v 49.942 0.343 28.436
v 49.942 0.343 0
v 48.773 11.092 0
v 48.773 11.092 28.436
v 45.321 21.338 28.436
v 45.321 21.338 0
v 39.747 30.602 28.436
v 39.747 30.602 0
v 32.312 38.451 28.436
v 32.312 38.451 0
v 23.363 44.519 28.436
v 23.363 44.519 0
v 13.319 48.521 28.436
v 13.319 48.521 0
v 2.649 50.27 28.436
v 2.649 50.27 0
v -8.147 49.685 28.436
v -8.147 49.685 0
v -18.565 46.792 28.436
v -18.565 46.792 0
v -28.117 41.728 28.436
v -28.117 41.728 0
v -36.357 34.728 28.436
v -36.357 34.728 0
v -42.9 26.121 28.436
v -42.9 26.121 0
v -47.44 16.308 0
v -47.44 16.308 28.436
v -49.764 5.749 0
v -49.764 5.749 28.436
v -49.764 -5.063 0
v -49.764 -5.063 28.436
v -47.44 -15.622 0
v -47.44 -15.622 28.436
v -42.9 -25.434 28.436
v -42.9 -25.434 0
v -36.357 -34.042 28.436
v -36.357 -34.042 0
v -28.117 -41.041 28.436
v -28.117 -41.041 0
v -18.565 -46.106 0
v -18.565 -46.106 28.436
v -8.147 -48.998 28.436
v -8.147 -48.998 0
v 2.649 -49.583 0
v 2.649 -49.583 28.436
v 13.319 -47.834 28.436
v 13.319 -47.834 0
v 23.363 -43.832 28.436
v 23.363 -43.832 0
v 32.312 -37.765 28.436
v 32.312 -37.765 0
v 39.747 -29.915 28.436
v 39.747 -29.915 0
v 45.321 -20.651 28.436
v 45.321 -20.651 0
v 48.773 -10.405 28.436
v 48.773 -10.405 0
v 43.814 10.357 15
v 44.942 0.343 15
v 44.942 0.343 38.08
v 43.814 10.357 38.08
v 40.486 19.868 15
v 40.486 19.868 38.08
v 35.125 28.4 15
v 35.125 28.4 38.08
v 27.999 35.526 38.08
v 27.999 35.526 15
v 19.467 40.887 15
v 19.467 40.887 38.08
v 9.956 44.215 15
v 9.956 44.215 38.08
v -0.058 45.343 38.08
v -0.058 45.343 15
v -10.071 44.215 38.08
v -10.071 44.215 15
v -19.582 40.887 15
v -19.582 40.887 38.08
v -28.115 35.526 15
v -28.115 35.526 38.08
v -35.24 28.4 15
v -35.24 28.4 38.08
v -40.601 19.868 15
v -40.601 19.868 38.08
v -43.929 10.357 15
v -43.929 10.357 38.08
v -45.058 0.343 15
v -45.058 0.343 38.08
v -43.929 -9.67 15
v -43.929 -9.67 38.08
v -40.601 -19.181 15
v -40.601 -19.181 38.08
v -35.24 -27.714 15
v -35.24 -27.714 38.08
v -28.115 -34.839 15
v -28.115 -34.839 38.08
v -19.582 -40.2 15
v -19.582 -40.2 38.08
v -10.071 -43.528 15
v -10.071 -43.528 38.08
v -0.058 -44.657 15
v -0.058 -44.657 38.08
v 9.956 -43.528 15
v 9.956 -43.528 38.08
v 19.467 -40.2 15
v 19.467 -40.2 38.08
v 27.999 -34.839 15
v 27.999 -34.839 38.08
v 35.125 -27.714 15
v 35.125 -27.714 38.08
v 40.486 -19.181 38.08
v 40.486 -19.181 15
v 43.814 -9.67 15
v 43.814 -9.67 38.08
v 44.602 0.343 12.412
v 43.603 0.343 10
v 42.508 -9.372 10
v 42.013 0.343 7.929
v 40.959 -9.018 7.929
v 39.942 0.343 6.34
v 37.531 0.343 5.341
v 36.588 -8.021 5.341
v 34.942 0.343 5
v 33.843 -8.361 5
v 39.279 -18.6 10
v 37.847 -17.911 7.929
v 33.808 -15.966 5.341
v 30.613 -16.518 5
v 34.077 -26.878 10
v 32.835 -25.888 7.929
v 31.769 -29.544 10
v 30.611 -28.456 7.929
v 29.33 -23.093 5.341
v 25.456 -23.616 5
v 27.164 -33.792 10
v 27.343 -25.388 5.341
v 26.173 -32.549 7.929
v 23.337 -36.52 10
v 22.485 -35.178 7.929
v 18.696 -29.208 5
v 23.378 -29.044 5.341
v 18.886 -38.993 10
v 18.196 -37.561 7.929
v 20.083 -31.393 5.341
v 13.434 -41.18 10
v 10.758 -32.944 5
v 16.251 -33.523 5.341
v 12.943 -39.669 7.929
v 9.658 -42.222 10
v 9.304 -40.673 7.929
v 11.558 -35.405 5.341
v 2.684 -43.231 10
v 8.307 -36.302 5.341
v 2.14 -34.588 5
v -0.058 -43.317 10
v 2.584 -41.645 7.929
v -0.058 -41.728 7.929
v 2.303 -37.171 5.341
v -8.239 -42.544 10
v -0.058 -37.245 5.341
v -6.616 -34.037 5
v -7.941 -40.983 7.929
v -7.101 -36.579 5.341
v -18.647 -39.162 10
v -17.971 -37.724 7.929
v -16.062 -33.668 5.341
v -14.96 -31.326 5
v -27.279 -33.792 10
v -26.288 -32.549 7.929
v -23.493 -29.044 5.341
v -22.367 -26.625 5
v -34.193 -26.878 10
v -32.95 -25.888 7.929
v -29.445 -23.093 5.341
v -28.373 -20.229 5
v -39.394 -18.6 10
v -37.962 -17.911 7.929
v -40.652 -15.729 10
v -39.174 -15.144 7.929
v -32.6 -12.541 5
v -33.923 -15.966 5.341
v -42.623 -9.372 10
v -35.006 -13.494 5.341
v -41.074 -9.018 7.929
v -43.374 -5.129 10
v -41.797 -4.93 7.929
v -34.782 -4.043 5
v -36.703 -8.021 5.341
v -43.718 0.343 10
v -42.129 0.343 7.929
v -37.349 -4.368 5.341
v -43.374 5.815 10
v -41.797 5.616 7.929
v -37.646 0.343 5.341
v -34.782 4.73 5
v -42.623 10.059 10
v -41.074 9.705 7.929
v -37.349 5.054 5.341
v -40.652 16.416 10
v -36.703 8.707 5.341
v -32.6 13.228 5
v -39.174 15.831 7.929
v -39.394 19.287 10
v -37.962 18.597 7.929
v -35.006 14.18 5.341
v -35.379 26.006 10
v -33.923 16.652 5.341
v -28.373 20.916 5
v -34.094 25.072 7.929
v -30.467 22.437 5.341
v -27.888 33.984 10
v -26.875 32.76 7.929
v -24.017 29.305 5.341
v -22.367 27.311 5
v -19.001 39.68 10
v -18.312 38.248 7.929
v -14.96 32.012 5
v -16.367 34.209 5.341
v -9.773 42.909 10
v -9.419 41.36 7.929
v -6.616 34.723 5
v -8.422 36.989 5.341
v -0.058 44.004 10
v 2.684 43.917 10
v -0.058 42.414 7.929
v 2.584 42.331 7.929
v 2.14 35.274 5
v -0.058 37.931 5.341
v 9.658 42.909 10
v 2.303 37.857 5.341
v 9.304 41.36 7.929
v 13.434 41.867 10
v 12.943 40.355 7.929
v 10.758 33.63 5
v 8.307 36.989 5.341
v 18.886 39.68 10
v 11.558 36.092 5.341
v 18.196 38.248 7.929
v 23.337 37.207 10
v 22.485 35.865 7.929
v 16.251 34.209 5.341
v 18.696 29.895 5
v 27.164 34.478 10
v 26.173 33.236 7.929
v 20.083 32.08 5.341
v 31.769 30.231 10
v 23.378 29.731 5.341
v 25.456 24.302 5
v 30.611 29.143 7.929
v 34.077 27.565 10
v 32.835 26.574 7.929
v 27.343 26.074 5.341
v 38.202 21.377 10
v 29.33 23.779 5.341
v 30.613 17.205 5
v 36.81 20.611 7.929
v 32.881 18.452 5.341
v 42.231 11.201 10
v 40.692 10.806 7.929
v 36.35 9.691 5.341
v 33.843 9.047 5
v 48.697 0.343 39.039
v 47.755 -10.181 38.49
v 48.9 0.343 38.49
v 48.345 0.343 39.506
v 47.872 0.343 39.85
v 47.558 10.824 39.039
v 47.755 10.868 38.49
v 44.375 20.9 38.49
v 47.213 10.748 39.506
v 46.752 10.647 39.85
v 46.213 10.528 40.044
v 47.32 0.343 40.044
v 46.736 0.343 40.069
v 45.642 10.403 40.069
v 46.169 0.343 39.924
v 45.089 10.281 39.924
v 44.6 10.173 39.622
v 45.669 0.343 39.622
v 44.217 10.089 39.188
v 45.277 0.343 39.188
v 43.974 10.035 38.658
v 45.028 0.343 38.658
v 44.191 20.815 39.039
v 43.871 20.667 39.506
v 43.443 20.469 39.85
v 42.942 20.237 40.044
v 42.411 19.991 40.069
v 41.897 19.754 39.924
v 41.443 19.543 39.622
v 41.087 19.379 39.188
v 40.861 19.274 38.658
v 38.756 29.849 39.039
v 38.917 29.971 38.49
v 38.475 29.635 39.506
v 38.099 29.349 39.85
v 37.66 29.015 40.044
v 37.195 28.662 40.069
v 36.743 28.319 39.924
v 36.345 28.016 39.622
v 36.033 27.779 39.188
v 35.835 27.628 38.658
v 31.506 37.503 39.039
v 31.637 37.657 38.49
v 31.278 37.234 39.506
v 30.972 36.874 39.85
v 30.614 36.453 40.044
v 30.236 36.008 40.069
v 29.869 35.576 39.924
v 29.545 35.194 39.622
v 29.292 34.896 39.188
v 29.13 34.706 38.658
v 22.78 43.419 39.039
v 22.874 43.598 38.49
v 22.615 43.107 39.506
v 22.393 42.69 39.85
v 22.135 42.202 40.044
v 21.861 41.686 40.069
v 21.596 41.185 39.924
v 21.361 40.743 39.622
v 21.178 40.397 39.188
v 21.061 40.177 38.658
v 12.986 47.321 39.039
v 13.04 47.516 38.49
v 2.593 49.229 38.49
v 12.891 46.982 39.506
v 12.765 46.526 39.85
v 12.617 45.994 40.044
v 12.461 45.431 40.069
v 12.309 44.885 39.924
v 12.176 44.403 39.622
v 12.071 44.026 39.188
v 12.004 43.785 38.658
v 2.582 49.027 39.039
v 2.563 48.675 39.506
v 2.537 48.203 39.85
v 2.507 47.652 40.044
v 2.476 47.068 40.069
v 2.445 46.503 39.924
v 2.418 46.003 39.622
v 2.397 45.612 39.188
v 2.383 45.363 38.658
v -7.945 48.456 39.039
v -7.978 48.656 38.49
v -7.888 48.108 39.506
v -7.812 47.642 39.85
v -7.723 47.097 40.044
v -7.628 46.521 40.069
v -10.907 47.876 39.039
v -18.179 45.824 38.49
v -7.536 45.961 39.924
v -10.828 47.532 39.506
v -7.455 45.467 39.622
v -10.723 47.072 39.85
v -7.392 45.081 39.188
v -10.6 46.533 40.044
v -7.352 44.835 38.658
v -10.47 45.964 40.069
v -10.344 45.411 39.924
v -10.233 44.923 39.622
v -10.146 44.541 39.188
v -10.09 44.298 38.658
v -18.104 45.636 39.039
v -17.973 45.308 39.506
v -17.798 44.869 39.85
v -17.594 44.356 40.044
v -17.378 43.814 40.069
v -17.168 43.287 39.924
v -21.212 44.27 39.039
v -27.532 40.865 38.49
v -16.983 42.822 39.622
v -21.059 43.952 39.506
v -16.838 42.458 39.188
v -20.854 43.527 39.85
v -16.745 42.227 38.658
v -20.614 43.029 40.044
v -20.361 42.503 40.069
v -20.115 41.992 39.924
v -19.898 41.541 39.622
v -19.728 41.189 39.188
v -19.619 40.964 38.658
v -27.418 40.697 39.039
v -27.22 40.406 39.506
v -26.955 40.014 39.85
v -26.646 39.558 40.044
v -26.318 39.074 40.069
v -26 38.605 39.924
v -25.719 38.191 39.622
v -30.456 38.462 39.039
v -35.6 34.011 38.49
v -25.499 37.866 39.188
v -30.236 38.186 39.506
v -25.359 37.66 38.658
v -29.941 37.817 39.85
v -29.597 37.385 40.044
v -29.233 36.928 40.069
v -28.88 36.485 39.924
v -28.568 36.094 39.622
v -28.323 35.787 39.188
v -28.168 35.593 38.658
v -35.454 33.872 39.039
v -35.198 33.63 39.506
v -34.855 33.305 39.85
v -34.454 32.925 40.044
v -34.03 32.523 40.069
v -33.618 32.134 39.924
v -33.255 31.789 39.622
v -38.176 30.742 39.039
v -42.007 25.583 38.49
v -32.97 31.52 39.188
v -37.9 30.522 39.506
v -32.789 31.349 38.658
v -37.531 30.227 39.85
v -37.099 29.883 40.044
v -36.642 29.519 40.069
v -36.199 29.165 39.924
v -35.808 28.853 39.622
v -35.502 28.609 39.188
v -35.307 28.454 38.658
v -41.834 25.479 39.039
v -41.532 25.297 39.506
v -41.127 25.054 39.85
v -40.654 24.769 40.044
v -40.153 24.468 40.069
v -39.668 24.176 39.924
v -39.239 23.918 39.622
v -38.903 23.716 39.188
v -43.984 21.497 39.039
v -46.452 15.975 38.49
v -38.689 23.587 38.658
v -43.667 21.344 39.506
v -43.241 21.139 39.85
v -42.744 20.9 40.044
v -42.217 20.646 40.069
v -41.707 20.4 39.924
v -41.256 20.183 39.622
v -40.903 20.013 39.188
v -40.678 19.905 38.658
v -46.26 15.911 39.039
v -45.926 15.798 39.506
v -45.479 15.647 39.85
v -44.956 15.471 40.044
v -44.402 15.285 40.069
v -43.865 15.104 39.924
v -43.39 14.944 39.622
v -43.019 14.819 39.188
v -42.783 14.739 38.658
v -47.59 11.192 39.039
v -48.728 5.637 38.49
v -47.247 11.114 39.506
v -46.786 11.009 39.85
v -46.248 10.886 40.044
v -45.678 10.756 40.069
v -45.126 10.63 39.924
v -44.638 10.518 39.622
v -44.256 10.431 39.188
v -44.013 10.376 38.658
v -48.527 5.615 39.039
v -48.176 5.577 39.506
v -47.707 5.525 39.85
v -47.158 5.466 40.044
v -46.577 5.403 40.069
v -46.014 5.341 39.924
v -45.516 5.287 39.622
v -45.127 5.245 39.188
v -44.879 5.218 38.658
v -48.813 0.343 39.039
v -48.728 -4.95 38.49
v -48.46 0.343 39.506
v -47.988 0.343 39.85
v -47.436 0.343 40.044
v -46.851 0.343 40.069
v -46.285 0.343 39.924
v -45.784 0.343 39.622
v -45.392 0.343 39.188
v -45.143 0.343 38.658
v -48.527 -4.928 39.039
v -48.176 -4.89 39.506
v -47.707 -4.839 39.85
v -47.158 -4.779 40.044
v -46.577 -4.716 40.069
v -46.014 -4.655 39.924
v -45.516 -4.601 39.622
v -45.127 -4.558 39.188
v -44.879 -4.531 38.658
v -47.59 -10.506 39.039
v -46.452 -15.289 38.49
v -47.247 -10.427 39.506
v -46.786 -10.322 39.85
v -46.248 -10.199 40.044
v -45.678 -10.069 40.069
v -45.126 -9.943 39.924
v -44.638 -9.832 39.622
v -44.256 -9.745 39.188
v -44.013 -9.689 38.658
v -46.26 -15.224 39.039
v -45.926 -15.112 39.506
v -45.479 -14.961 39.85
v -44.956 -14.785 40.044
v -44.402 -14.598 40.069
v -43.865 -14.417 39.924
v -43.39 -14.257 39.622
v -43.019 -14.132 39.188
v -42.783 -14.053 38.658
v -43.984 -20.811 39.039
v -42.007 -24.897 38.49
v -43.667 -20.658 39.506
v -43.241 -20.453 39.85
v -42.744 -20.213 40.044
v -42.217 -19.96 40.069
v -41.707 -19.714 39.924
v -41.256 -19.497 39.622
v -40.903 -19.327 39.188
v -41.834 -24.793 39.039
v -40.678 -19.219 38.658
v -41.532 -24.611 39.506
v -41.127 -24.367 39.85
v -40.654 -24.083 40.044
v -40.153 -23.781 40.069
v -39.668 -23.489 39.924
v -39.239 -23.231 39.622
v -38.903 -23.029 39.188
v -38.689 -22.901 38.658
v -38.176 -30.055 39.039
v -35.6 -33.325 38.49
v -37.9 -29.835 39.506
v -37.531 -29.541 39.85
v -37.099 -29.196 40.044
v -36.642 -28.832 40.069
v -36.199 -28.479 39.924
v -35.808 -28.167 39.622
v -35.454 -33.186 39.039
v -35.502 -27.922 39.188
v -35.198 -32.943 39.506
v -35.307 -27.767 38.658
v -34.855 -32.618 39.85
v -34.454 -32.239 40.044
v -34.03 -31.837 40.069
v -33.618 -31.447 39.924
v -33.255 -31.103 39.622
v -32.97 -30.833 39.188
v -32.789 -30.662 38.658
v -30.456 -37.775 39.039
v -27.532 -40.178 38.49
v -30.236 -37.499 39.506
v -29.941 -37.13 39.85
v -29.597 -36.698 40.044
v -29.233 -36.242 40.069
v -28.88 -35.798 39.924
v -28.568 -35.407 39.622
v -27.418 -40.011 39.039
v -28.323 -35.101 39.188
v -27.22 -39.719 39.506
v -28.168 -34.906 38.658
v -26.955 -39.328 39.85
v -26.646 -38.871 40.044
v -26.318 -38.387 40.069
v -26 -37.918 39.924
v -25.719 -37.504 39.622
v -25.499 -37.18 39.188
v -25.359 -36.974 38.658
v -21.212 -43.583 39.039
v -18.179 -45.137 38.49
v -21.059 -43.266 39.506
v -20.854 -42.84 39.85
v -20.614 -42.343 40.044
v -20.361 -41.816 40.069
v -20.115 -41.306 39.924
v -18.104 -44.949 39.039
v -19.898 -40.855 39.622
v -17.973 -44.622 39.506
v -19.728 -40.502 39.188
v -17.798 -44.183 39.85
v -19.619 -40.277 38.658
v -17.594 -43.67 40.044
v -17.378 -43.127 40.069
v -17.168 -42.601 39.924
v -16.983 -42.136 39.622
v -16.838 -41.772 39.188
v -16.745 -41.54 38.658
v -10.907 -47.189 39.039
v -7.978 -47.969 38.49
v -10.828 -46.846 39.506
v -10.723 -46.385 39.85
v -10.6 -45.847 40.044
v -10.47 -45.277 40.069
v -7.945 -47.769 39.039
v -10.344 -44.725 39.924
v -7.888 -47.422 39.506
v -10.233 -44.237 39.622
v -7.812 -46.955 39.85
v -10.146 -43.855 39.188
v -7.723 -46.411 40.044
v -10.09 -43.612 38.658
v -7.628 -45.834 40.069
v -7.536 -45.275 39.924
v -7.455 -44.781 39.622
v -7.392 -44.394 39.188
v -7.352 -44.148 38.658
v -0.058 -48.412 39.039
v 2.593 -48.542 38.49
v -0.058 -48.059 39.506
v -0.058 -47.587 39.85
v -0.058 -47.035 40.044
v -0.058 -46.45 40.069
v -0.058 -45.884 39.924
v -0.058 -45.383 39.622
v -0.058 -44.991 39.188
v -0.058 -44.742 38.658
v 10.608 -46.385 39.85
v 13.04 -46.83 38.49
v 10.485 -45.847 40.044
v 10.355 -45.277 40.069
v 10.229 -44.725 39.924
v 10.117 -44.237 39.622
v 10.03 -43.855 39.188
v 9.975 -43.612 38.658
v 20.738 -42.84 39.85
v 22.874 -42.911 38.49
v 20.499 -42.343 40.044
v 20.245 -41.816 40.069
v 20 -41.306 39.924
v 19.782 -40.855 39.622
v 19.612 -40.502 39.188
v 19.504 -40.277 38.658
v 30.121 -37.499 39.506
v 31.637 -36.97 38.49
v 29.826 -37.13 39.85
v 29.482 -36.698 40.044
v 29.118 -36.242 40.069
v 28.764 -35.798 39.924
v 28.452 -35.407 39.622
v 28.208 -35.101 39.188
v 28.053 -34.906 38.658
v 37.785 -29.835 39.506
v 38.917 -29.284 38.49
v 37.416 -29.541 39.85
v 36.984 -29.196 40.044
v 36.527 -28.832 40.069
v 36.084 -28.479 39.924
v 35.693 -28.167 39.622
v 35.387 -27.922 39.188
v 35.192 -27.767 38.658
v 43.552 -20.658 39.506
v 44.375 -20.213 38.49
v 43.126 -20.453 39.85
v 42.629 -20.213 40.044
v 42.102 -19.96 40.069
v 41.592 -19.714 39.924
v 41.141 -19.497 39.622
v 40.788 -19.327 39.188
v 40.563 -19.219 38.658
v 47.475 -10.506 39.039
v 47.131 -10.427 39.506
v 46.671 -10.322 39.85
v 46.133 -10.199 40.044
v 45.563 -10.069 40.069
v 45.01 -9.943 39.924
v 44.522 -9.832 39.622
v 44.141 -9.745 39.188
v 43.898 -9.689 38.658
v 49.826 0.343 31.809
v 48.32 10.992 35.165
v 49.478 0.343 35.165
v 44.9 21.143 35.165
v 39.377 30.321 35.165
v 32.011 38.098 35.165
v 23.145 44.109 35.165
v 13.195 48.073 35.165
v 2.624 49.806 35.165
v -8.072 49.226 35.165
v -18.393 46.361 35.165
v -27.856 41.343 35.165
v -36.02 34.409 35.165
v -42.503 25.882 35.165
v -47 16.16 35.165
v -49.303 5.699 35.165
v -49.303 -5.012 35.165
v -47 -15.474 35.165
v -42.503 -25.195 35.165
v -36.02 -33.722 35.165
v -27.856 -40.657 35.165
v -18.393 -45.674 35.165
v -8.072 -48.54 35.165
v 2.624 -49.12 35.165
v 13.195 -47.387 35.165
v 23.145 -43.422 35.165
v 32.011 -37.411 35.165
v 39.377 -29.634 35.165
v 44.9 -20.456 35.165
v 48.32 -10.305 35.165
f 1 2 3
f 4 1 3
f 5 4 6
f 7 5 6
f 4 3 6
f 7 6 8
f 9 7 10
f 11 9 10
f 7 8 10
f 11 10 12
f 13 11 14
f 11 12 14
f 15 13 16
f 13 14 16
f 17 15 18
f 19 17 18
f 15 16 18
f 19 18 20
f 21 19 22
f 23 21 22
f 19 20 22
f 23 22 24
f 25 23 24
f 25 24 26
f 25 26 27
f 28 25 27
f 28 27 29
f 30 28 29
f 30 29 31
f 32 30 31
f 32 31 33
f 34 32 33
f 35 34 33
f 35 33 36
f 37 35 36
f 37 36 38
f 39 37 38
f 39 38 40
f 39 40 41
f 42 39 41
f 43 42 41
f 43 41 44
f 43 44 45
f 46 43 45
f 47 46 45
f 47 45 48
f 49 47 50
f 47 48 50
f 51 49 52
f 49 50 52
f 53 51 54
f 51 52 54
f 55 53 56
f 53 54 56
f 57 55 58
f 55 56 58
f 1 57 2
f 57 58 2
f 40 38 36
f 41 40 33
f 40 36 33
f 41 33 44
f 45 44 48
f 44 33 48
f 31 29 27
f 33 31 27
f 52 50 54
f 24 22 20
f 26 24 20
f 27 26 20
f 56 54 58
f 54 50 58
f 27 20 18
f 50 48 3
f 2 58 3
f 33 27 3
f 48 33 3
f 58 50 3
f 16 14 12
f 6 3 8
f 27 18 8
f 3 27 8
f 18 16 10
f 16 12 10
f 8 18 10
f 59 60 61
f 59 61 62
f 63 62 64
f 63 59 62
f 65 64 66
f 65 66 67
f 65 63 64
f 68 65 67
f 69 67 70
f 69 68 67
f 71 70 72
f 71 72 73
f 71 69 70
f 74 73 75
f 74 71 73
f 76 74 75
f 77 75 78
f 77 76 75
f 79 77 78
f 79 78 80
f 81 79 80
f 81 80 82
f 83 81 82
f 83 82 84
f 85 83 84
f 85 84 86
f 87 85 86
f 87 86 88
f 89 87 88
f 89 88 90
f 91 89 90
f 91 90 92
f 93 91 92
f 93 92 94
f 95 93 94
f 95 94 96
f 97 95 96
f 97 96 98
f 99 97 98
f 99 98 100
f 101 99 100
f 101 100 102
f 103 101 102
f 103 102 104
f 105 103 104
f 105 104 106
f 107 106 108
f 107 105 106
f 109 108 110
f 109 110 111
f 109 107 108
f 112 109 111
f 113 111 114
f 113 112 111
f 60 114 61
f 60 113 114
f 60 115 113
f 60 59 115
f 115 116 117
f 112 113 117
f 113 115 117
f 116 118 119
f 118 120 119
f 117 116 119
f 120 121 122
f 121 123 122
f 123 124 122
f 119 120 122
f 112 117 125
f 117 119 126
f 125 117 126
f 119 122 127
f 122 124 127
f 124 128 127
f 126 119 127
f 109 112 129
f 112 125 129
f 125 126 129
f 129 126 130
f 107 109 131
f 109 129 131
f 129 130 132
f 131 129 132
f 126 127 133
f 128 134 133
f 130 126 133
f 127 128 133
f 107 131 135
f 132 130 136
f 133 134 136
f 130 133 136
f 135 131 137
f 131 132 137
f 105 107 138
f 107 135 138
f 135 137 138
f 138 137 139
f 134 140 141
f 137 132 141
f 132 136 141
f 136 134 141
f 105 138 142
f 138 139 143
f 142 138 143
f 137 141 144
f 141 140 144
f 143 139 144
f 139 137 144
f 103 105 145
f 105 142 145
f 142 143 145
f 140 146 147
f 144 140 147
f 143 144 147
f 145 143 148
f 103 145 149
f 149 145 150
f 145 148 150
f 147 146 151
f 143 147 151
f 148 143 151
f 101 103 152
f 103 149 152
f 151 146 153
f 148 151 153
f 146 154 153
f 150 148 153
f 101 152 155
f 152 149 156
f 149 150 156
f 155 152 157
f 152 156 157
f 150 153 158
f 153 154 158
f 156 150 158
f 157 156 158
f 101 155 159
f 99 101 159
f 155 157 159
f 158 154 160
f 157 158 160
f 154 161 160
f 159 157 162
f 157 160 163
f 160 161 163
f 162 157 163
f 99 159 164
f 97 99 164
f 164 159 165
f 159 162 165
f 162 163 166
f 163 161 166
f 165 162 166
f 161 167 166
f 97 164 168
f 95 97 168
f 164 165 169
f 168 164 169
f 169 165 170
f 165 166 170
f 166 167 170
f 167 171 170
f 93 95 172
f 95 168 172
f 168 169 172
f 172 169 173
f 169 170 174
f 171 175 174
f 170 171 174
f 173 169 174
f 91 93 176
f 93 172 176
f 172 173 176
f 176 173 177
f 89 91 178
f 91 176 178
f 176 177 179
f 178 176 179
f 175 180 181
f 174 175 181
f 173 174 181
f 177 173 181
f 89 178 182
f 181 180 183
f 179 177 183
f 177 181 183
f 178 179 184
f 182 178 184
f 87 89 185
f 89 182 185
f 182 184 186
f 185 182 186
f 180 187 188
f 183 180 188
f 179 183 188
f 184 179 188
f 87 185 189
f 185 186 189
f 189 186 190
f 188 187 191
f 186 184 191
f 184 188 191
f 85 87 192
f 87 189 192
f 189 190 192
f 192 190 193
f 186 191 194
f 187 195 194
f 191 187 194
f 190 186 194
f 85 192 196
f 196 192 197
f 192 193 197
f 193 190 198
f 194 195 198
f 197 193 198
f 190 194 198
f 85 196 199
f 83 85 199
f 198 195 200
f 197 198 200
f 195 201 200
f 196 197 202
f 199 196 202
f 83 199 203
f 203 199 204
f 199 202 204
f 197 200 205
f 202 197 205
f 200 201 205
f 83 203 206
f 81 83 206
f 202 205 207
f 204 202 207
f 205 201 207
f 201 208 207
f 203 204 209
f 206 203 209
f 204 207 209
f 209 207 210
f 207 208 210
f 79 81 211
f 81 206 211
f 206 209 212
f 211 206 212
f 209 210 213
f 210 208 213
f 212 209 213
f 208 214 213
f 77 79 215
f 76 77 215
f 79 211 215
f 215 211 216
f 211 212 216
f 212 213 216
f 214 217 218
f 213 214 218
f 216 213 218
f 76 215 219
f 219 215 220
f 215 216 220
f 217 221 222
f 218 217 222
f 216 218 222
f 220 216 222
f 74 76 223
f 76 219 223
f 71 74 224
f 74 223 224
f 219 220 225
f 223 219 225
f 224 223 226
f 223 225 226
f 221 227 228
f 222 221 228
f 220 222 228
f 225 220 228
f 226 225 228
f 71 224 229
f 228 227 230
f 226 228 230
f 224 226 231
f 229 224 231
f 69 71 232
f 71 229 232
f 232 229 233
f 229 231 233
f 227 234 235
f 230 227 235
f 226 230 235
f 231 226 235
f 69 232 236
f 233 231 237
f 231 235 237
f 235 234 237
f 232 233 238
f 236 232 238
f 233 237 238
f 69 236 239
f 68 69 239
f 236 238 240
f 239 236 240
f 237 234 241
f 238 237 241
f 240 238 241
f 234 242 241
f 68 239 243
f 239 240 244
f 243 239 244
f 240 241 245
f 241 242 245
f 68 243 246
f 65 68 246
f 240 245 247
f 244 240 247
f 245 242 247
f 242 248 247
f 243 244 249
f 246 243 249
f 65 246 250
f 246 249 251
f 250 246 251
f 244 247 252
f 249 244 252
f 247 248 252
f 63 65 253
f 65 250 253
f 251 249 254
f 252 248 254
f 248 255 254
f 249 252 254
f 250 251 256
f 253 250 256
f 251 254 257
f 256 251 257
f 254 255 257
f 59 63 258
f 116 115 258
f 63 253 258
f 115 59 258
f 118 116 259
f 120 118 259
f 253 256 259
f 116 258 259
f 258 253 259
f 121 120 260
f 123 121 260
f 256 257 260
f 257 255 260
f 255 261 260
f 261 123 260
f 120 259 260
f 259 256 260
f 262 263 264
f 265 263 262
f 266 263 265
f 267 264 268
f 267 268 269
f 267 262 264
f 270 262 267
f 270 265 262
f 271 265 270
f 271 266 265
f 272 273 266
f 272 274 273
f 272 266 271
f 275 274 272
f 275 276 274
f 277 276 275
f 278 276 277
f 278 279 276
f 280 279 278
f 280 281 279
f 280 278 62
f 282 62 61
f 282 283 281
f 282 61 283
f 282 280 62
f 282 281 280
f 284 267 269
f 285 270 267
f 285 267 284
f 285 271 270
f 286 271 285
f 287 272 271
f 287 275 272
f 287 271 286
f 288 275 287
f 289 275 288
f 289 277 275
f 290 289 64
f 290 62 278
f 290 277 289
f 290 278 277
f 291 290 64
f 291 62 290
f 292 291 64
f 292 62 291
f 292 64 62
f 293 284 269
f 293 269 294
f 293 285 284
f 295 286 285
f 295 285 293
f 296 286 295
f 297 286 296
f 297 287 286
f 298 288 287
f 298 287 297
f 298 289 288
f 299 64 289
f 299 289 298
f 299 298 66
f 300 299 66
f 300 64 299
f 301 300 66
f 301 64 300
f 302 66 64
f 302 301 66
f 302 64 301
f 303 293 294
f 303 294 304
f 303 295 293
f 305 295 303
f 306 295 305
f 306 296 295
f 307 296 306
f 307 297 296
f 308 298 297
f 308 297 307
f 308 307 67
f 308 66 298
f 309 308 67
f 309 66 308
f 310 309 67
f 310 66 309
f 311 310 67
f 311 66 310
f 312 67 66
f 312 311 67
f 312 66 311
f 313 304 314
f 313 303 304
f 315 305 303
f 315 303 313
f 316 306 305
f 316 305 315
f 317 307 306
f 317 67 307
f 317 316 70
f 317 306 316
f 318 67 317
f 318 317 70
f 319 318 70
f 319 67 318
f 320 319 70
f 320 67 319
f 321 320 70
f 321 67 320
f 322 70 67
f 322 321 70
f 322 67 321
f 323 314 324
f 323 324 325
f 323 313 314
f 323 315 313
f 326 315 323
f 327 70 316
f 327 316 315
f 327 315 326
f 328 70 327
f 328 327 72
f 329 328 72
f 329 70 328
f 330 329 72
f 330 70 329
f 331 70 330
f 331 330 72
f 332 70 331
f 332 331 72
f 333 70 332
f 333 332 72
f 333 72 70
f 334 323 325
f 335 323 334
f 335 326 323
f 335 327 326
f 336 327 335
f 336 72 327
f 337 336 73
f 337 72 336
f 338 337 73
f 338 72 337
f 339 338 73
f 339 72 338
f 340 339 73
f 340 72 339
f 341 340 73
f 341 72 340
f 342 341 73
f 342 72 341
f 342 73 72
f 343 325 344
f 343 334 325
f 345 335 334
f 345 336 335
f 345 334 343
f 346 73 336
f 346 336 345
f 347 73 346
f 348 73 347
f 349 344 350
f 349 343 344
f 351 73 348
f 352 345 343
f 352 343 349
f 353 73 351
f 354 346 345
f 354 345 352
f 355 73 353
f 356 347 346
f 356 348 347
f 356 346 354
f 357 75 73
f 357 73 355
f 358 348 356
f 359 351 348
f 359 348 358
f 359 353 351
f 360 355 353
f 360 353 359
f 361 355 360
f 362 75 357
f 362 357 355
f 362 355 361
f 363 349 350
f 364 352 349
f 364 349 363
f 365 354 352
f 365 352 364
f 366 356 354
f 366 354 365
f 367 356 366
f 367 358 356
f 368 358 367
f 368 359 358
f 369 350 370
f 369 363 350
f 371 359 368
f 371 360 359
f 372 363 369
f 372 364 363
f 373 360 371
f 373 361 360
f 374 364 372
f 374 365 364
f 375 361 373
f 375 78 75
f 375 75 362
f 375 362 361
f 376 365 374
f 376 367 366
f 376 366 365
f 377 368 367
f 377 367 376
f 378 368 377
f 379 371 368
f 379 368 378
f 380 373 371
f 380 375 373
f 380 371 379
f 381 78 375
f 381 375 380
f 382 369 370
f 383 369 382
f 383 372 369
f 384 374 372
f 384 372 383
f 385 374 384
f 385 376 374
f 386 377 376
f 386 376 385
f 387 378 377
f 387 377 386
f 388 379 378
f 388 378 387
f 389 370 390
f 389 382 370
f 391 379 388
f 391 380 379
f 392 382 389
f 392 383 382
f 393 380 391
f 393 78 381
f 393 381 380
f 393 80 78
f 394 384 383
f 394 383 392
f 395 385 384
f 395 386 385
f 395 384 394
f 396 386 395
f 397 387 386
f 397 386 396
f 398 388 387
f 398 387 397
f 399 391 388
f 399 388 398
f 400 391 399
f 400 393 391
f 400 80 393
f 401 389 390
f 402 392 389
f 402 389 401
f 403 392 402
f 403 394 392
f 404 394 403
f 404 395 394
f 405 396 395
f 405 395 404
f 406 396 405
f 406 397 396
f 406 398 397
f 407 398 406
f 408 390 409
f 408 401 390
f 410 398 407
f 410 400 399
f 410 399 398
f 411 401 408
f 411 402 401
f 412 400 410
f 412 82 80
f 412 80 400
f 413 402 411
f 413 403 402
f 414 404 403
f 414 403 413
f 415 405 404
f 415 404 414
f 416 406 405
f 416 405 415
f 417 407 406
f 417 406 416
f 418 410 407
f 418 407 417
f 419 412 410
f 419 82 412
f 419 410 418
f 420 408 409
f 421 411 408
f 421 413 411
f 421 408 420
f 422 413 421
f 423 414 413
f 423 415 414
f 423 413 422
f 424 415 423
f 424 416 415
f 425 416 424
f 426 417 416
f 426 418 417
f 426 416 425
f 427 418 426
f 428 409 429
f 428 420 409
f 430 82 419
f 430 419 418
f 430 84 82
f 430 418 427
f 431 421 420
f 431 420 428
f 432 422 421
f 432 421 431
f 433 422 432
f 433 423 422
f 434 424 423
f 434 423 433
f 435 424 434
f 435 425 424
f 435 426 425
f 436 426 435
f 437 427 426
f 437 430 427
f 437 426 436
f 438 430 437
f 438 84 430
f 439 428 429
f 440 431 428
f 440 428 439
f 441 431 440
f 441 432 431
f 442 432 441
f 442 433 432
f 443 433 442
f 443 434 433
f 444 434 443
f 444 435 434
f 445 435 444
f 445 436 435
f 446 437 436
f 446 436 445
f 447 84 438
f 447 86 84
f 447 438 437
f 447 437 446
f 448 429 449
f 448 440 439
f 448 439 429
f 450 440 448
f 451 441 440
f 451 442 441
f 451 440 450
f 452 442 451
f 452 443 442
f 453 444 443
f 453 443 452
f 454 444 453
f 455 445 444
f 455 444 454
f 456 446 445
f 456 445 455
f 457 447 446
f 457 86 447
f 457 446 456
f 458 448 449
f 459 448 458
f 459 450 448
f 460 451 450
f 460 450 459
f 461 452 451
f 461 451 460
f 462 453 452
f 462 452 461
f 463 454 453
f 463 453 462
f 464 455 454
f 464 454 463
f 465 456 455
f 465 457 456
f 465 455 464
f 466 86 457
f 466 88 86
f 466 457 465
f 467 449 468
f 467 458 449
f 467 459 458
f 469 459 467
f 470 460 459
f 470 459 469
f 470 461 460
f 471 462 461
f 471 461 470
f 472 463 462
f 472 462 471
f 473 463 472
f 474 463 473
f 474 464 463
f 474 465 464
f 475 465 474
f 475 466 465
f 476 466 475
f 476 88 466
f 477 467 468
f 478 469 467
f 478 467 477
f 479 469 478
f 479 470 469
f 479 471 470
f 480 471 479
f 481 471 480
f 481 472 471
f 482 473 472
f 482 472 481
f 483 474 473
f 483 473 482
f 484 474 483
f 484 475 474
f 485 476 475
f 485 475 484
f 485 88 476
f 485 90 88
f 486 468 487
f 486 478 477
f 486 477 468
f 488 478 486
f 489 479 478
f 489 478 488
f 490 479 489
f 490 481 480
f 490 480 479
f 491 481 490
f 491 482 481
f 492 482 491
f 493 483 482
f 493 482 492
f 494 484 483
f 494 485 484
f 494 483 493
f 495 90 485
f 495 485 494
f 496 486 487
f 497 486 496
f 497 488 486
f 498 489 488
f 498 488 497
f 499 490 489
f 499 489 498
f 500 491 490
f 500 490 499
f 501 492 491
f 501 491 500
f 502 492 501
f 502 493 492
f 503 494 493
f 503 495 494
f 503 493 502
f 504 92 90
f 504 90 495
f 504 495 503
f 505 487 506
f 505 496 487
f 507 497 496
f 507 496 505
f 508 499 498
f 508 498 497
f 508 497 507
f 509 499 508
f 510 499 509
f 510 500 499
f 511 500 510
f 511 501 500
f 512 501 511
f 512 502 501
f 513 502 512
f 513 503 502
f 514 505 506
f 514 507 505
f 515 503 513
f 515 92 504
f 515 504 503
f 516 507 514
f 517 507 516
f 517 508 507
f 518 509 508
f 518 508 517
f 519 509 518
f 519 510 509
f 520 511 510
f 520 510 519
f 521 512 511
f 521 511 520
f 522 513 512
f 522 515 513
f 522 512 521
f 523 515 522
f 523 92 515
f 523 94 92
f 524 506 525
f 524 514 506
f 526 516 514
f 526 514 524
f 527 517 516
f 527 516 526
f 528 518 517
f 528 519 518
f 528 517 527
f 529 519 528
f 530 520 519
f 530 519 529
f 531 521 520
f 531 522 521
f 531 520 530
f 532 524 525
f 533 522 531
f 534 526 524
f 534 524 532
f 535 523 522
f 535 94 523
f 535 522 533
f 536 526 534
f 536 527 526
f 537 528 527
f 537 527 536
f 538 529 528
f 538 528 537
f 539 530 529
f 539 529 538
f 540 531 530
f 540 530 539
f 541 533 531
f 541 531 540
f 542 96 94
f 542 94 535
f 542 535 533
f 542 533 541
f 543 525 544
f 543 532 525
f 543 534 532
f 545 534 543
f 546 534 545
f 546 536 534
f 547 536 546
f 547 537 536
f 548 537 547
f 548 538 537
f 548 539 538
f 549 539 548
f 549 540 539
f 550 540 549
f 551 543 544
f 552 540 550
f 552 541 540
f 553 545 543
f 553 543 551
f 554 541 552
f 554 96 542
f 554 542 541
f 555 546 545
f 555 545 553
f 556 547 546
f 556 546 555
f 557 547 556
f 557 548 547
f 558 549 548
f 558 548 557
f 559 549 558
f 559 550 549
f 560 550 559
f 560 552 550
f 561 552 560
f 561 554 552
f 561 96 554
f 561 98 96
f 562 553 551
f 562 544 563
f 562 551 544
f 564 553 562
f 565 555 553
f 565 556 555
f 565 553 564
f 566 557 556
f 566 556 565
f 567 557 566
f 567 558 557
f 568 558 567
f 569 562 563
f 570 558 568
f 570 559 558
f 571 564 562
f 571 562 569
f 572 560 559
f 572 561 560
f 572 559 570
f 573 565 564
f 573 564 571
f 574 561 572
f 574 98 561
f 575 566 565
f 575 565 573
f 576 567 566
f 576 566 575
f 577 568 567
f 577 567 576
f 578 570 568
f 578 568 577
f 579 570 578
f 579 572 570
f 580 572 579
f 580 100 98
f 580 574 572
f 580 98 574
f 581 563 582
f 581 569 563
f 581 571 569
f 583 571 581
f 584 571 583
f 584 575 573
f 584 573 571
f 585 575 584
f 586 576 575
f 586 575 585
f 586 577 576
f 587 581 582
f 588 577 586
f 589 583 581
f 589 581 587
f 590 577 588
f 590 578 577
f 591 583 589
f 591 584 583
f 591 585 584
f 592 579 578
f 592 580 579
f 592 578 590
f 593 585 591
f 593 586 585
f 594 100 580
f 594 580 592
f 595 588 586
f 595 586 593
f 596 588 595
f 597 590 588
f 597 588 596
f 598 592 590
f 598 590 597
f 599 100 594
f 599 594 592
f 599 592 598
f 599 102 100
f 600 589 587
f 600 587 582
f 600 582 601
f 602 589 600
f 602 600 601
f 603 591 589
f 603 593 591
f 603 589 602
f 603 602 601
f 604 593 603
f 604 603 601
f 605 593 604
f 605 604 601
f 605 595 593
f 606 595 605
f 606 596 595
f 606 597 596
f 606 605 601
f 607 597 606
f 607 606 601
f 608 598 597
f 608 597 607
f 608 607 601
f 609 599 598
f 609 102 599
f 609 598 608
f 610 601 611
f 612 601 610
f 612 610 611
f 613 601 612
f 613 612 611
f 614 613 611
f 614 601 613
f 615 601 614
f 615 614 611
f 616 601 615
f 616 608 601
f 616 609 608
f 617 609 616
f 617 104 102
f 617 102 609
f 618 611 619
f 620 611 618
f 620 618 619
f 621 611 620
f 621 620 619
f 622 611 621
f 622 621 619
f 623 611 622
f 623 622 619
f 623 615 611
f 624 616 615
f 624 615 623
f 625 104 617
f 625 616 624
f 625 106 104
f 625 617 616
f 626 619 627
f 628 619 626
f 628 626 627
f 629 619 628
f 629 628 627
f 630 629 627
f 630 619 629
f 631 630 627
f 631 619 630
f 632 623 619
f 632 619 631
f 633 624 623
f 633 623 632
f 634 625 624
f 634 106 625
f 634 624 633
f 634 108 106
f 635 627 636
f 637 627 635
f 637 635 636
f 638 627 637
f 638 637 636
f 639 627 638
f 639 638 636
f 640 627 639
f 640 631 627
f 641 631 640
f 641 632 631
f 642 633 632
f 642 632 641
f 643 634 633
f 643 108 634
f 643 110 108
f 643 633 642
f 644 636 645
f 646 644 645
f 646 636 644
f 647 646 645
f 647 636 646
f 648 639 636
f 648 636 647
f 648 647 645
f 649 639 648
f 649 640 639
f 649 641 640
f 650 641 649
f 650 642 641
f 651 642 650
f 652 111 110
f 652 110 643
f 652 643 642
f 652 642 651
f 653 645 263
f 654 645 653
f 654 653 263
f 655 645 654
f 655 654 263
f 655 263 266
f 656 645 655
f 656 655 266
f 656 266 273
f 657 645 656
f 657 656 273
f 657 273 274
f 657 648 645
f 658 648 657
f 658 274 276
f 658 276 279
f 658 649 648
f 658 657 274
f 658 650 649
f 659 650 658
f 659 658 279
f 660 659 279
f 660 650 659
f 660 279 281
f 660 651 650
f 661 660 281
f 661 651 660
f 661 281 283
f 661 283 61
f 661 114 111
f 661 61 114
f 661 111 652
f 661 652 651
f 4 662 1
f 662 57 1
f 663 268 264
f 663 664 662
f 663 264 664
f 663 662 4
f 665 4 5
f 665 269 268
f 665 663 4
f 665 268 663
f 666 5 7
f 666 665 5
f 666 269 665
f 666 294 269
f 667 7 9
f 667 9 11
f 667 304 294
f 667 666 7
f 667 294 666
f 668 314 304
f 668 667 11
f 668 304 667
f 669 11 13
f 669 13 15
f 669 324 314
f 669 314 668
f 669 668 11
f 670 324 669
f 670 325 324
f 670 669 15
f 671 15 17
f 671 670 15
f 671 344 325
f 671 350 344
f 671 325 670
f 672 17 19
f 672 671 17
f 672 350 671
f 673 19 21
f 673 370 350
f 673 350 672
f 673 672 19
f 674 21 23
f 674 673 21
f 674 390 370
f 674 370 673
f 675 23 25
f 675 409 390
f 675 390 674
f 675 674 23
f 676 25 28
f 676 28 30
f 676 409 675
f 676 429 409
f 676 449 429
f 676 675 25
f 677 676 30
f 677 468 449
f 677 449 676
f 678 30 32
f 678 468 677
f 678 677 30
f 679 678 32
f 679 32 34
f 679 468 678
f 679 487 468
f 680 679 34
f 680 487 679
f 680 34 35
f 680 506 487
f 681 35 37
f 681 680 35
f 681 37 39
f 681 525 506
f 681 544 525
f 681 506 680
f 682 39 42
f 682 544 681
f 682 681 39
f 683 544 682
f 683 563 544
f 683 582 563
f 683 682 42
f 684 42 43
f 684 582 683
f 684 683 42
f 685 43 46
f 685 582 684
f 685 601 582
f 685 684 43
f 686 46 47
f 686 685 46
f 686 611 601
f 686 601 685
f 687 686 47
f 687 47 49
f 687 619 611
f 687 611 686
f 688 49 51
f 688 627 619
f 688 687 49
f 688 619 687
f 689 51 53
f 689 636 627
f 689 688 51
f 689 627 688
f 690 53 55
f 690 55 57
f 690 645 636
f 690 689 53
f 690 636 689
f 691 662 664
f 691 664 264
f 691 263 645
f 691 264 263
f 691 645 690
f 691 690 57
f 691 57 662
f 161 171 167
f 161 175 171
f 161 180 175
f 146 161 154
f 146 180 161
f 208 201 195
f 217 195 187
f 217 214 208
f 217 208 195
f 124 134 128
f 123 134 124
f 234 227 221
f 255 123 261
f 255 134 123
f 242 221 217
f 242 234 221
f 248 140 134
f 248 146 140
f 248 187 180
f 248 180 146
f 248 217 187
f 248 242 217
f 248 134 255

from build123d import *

# Parameters (mm, degrees)
F0_R     = 50
F1_DEPTH = 50
F2_T     = -5
F5_R     = 10


# Not quite as in the source:
# - a fillet or chamfer that OpenCascade refuses, or shapes differently, is made with other operations: its cross-section is extruded or revolved along the edge and cut away or added


with BuildPart() as f1:
    # F0 (on Top) → F1 (new body)
    with BuildSketch(Plane.XY):
        with Locations((-0.0575962756, 0.3432892042)):
            Circle(F0_R)
    extrude(amount=F1_DEPTH)

    # F2
    f2_openings = [f1.faces().sort_by_distance(p)[0] for p in [
        (-0.057596, 0.343289, 50),
    ]]
    offset(amount=F2_T, openings=f2_openings)

    # F3: fillet of radius 49 on 1 edges, made by hand

    # F3_s1 → F3_t2 (revolve, cut)
    with BuildSketch(Plane.XZ.offset(-0.3432892042)):
        with BuildLine():
            ThreePointArc((49.9424037244, 28.4361413472), (48.6760396639, 39.5041131577), (44.9424037244, 50))
            Line((44.9424037244, 50), (49.9424037244, 50))
            Line((49.9424037244, 50), (49.9424037244, 28.4361413472))
        make_face()
    revolve(axis=Axis((-0.0575962756, 0.3432892042, 50), (0, 0, 1)), mode=Mode.SUBTRACT)

    # F4: fillet of radius 2 on 1 edges, made by hand

    # F4_s1 → F4_t2 (revolve, cut)
    with BuildSketch(Plane.XZ.offset(-0.3432892042)):
        with BuildLine():
            ThreePointArc((48.8998505329, 38.4901602258), (46.7361194752, 40.0691253656), (44.9424037244, 38.0797921083))
            Line((44.9424037244, 38.0797921083), (44.9424037244, 50))
            ThreePointArc((44.9424037244, 50), (47.2798843291, 44.3684321809), (48.8998505329, 38.4901602258))
        make_face()
    revolve(axis=Axis((-0.0575962756, 0.3432892042, 50), (0, 0, 1)), mode=Mode.SUBTRACT)

    # F5
    f5_edges = [f1.edges().sort_by_distance(p)[0] for p in [
        (-45.057596, 0.343289, 5),
    ]]
    fillet(f5_edges, radius=F5_R)


solid = f1.part
